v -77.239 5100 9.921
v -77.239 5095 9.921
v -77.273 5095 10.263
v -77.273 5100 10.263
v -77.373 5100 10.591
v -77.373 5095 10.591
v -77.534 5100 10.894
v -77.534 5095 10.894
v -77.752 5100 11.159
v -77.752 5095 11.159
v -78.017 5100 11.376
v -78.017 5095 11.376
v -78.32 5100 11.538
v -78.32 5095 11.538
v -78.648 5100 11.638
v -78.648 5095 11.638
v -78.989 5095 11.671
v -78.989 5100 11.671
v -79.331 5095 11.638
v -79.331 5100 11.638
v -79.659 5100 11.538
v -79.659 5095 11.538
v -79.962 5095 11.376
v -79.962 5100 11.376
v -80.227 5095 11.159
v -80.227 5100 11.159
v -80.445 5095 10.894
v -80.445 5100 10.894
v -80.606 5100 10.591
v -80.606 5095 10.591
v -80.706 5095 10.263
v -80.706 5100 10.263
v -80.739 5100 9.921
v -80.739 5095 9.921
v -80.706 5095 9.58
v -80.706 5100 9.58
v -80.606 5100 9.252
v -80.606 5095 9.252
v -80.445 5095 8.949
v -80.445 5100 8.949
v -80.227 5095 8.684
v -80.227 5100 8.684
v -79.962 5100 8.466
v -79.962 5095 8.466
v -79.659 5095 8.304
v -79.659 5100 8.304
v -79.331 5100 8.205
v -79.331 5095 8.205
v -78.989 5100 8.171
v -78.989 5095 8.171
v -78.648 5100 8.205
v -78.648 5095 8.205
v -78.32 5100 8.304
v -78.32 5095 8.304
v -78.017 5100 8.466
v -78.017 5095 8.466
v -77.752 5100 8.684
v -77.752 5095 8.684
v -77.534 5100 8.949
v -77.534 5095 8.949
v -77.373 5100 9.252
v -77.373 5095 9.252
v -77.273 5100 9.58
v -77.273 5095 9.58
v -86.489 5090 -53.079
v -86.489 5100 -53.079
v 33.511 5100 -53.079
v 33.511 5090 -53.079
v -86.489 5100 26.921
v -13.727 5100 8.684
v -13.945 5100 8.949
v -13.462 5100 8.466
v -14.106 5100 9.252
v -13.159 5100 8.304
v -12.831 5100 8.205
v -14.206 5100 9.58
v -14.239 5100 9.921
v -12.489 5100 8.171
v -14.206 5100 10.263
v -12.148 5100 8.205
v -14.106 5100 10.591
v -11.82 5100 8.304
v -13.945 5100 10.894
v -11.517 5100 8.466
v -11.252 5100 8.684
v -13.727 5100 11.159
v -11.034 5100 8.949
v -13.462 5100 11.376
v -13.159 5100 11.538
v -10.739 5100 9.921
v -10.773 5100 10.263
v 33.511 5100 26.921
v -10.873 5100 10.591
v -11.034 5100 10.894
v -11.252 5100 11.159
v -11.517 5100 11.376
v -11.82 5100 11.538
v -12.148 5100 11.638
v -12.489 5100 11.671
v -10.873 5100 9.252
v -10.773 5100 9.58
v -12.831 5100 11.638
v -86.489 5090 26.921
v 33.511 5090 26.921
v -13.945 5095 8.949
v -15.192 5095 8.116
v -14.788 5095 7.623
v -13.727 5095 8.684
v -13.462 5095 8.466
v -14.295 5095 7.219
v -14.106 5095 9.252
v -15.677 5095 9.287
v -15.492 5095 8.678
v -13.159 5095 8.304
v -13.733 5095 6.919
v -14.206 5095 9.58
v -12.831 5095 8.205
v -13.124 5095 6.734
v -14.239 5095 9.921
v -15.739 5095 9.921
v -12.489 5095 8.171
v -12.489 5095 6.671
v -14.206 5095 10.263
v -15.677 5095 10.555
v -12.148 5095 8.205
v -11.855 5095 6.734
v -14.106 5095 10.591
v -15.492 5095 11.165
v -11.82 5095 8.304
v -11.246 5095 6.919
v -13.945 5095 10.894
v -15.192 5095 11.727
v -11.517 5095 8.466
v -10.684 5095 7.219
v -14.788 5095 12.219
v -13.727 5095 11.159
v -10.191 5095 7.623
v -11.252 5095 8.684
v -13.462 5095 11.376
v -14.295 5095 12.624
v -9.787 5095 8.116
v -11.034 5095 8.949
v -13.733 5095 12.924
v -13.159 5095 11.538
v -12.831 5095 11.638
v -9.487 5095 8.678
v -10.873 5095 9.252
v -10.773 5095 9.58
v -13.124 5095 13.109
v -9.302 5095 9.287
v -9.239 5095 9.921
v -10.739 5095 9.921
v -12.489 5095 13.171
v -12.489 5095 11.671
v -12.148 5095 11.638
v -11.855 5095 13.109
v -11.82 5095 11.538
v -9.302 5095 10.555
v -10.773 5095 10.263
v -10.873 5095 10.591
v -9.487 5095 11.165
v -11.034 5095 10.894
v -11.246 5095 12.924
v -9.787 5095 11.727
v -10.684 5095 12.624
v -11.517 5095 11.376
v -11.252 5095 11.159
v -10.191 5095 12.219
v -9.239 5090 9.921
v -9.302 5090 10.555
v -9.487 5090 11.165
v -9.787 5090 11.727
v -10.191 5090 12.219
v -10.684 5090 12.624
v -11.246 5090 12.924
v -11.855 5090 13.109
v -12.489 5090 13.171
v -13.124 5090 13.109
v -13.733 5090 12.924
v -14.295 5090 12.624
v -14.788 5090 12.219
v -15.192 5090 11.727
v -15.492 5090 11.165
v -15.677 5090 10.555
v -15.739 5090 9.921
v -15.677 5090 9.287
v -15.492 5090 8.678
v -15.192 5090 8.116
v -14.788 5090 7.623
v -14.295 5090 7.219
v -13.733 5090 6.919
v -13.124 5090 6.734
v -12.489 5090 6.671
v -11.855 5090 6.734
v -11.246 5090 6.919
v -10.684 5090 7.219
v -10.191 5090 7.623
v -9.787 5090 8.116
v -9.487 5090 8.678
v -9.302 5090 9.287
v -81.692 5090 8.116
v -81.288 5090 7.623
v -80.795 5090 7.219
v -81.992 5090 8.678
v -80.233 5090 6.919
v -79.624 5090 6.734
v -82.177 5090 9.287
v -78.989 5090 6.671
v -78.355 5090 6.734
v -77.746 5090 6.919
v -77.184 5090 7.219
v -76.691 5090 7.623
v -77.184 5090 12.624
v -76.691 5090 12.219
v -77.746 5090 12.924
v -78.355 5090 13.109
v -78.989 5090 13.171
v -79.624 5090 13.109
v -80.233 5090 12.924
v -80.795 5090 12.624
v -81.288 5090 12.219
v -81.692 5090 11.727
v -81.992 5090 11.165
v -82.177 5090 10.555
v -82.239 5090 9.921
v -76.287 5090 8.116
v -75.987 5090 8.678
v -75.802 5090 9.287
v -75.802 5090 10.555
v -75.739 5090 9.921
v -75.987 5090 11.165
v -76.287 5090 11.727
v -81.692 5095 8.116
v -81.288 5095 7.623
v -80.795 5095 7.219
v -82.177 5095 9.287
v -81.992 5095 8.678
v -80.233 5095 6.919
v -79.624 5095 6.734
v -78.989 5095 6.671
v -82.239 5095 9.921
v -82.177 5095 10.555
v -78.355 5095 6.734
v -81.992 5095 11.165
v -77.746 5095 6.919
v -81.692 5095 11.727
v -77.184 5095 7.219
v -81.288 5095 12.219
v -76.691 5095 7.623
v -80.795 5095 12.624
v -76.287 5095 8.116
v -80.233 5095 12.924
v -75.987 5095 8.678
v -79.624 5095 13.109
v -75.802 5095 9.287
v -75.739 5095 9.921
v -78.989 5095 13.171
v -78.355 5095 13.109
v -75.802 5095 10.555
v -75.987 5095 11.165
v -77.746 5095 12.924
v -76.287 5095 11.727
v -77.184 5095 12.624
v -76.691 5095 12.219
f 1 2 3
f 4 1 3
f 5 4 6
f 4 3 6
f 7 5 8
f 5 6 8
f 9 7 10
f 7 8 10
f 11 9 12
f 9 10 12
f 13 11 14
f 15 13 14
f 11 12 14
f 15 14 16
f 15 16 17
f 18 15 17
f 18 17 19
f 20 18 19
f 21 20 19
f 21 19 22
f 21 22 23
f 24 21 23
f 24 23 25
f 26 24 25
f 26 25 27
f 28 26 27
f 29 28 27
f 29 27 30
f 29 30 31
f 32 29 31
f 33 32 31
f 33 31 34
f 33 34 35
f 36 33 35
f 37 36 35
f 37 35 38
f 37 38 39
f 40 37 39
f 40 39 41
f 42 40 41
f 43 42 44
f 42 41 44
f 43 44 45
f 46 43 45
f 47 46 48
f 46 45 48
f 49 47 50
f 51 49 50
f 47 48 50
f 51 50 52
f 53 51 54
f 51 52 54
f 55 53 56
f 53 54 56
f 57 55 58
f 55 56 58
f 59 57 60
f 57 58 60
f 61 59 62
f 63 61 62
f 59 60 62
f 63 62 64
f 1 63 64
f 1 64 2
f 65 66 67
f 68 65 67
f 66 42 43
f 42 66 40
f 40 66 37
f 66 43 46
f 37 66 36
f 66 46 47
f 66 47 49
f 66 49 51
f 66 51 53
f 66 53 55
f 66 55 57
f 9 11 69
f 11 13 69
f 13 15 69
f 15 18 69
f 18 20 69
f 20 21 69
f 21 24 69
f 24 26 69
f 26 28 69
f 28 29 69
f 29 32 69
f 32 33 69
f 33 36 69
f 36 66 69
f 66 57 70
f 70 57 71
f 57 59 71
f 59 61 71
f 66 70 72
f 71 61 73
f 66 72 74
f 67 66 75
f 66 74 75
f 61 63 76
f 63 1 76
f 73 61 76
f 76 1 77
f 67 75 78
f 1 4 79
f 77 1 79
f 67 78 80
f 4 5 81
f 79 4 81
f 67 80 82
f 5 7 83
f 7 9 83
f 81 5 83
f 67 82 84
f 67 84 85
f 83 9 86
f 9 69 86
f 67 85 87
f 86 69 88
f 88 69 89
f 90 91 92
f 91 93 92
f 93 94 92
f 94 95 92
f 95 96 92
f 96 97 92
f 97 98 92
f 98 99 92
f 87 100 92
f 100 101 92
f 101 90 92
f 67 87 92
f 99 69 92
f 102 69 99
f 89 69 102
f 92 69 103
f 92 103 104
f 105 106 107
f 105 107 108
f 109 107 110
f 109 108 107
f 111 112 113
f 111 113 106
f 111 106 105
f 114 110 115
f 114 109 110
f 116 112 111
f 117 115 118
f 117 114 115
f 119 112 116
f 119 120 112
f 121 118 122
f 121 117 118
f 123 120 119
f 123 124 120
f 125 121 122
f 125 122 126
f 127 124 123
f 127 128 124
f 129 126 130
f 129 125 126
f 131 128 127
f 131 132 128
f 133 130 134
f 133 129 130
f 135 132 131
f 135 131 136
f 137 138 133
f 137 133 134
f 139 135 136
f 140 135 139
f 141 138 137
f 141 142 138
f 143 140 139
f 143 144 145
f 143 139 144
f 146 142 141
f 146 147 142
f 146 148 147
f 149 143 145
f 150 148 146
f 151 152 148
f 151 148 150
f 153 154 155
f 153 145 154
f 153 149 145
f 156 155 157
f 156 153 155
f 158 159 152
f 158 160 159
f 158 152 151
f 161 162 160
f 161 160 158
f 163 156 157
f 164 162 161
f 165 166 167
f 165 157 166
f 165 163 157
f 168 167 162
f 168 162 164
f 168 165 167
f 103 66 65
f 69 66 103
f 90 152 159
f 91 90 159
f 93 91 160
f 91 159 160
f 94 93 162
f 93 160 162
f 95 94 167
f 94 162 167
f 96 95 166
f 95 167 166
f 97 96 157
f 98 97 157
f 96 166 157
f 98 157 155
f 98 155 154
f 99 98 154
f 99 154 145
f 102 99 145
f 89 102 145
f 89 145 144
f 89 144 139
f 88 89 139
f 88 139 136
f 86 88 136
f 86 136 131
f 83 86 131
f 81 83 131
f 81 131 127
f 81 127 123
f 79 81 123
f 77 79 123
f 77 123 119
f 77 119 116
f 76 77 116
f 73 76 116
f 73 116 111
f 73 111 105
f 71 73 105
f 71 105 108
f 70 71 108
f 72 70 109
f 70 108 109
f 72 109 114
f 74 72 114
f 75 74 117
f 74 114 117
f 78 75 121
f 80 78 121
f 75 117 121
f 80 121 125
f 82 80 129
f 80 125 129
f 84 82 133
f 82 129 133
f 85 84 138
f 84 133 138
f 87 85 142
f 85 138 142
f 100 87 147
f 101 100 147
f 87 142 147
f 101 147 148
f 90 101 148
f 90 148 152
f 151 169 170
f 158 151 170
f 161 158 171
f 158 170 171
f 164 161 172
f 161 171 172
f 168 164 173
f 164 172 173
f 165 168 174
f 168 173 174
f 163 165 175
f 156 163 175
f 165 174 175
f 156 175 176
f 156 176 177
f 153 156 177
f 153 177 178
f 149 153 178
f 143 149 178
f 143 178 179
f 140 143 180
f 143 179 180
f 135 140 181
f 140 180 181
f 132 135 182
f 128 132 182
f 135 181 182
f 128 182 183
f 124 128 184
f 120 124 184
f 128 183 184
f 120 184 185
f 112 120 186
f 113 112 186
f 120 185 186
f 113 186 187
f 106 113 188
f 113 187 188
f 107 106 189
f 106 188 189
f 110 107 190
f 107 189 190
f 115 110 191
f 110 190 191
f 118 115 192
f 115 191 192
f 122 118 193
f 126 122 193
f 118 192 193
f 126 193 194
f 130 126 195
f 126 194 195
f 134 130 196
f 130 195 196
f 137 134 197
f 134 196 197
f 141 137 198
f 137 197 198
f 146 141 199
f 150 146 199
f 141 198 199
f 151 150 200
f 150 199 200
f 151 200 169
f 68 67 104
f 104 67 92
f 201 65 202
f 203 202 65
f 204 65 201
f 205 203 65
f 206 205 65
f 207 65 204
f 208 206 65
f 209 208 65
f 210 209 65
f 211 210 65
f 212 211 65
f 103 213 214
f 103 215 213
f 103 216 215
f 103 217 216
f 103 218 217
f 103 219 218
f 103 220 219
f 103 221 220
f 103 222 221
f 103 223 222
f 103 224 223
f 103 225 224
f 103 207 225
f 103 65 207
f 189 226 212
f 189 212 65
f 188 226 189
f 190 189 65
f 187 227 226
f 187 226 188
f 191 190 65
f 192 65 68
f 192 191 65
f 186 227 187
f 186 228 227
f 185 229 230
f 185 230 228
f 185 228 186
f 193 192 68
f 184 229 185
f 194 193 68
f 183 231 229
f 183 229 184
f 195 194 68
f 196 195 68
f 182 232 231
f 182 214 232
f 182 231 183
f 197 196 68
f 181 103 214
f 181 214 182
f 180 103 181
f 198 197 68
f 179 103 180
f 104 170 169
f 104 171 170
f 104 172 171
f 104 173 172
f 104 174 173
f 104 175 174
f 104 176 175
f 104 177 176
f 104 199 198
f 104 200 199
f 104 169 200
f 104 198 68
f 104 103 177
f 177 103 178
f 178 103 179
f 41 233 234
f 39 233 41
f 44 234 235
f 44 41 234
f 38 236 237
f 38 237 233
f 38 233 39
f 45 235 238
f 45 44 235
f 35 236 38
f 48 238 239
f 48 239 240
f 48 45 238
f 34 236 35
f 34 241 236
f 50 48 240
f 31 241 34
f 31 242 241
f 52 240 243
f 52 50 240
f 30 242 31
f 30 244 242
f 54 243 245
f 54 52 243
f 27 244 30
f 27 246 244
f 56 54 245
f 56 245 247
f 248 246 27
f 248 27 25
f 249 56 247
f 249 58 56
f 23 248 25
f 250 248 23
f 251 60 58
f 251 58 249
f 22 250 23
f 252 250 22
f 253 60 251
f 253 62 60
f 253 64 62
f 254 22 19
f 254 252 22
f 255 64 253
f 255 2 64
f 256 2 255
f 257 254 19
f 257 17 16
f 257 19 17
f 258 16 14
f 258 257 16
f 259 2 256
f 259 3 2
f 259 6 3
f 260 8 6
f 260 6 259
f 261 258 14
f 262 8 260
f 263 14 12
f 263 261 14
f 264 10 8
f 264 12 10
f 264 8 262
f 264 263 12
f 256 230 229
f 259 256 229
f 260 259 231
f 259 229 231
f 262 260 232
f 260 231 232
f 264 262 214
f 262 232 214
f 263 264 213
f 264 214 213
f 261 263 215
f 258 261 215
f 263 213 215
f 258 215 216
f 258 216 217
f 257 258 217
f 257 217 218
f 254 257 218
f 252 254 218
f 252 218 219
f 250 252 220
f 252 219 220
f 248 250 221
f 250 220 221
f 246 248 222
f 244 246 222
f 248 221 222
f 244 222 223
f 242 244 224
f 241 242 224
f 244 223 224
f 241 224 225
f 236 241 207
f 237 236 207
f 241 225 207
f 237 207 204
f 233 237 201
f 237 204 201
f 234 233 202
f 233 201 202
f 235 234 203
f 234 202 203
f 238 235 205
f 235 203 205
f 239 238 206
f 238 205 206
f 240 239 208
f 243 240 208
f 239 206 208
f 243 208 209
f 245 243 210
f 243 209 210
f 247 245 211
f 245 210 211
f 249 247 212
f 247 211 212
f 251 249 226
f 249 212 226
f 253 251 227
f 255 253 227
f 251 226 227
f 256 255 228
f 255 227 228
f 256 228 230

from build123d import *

# Parameters (mm, degrees)
SKETCH1_W           = 120
SKETCH1_H           = 80
BOSS_EXTRUDE1_DEPTH = 10
SKETCH2_R           = 1.75
CUT_EXTRUDE1_DEPTH  = 11
SKETCH3_R           = 3.25
CUT_EXTRUDE2_DEPTH  = 5


with BuildPart() as part:
    # Sketch1 → Boss-Extrude1 (new body)
    with BuildSketch(Plane.XZ.offset(-5100)):
        with Locations((-26.489460092, -13.07873573)):
            Rectangle(SKETCH1_W, SKETCH1_H)
    extrude(amount=BOSS_EXTRUDE1_DEPTH)

    # Sketch2 → Cut-Extrude1 (cut, through all)
    with BuildSketch(Plane.XZ.offset(-5090)):
        with Locations((-78.989460092, 9.92126427)):
            Circle(SKETCH2_R)
        with Locations((-12.489460092, 9.92126427)):
            Circle(SKETCH2_R)
    extrude(amount=-CUT_EXTRUDE1_DEPTH, mode=Mode.SUBTRACT)

    # Sketch3 → Cut-Extrude2 (cut)
    with BuildSketch(Plane.XZ.offset(-5090)):
        with Locations((-78.989460092, 9.92126427)):
            Circle(SKETCH3_R)
        with Locations((-12.489460092, 9.92126427)):
            Circle(SKETCH3_R)
    extrude(amount=-CUT_EXTRUDE2_DEPTH, mode=Mode.SUBTRACT)


solid = part.part
